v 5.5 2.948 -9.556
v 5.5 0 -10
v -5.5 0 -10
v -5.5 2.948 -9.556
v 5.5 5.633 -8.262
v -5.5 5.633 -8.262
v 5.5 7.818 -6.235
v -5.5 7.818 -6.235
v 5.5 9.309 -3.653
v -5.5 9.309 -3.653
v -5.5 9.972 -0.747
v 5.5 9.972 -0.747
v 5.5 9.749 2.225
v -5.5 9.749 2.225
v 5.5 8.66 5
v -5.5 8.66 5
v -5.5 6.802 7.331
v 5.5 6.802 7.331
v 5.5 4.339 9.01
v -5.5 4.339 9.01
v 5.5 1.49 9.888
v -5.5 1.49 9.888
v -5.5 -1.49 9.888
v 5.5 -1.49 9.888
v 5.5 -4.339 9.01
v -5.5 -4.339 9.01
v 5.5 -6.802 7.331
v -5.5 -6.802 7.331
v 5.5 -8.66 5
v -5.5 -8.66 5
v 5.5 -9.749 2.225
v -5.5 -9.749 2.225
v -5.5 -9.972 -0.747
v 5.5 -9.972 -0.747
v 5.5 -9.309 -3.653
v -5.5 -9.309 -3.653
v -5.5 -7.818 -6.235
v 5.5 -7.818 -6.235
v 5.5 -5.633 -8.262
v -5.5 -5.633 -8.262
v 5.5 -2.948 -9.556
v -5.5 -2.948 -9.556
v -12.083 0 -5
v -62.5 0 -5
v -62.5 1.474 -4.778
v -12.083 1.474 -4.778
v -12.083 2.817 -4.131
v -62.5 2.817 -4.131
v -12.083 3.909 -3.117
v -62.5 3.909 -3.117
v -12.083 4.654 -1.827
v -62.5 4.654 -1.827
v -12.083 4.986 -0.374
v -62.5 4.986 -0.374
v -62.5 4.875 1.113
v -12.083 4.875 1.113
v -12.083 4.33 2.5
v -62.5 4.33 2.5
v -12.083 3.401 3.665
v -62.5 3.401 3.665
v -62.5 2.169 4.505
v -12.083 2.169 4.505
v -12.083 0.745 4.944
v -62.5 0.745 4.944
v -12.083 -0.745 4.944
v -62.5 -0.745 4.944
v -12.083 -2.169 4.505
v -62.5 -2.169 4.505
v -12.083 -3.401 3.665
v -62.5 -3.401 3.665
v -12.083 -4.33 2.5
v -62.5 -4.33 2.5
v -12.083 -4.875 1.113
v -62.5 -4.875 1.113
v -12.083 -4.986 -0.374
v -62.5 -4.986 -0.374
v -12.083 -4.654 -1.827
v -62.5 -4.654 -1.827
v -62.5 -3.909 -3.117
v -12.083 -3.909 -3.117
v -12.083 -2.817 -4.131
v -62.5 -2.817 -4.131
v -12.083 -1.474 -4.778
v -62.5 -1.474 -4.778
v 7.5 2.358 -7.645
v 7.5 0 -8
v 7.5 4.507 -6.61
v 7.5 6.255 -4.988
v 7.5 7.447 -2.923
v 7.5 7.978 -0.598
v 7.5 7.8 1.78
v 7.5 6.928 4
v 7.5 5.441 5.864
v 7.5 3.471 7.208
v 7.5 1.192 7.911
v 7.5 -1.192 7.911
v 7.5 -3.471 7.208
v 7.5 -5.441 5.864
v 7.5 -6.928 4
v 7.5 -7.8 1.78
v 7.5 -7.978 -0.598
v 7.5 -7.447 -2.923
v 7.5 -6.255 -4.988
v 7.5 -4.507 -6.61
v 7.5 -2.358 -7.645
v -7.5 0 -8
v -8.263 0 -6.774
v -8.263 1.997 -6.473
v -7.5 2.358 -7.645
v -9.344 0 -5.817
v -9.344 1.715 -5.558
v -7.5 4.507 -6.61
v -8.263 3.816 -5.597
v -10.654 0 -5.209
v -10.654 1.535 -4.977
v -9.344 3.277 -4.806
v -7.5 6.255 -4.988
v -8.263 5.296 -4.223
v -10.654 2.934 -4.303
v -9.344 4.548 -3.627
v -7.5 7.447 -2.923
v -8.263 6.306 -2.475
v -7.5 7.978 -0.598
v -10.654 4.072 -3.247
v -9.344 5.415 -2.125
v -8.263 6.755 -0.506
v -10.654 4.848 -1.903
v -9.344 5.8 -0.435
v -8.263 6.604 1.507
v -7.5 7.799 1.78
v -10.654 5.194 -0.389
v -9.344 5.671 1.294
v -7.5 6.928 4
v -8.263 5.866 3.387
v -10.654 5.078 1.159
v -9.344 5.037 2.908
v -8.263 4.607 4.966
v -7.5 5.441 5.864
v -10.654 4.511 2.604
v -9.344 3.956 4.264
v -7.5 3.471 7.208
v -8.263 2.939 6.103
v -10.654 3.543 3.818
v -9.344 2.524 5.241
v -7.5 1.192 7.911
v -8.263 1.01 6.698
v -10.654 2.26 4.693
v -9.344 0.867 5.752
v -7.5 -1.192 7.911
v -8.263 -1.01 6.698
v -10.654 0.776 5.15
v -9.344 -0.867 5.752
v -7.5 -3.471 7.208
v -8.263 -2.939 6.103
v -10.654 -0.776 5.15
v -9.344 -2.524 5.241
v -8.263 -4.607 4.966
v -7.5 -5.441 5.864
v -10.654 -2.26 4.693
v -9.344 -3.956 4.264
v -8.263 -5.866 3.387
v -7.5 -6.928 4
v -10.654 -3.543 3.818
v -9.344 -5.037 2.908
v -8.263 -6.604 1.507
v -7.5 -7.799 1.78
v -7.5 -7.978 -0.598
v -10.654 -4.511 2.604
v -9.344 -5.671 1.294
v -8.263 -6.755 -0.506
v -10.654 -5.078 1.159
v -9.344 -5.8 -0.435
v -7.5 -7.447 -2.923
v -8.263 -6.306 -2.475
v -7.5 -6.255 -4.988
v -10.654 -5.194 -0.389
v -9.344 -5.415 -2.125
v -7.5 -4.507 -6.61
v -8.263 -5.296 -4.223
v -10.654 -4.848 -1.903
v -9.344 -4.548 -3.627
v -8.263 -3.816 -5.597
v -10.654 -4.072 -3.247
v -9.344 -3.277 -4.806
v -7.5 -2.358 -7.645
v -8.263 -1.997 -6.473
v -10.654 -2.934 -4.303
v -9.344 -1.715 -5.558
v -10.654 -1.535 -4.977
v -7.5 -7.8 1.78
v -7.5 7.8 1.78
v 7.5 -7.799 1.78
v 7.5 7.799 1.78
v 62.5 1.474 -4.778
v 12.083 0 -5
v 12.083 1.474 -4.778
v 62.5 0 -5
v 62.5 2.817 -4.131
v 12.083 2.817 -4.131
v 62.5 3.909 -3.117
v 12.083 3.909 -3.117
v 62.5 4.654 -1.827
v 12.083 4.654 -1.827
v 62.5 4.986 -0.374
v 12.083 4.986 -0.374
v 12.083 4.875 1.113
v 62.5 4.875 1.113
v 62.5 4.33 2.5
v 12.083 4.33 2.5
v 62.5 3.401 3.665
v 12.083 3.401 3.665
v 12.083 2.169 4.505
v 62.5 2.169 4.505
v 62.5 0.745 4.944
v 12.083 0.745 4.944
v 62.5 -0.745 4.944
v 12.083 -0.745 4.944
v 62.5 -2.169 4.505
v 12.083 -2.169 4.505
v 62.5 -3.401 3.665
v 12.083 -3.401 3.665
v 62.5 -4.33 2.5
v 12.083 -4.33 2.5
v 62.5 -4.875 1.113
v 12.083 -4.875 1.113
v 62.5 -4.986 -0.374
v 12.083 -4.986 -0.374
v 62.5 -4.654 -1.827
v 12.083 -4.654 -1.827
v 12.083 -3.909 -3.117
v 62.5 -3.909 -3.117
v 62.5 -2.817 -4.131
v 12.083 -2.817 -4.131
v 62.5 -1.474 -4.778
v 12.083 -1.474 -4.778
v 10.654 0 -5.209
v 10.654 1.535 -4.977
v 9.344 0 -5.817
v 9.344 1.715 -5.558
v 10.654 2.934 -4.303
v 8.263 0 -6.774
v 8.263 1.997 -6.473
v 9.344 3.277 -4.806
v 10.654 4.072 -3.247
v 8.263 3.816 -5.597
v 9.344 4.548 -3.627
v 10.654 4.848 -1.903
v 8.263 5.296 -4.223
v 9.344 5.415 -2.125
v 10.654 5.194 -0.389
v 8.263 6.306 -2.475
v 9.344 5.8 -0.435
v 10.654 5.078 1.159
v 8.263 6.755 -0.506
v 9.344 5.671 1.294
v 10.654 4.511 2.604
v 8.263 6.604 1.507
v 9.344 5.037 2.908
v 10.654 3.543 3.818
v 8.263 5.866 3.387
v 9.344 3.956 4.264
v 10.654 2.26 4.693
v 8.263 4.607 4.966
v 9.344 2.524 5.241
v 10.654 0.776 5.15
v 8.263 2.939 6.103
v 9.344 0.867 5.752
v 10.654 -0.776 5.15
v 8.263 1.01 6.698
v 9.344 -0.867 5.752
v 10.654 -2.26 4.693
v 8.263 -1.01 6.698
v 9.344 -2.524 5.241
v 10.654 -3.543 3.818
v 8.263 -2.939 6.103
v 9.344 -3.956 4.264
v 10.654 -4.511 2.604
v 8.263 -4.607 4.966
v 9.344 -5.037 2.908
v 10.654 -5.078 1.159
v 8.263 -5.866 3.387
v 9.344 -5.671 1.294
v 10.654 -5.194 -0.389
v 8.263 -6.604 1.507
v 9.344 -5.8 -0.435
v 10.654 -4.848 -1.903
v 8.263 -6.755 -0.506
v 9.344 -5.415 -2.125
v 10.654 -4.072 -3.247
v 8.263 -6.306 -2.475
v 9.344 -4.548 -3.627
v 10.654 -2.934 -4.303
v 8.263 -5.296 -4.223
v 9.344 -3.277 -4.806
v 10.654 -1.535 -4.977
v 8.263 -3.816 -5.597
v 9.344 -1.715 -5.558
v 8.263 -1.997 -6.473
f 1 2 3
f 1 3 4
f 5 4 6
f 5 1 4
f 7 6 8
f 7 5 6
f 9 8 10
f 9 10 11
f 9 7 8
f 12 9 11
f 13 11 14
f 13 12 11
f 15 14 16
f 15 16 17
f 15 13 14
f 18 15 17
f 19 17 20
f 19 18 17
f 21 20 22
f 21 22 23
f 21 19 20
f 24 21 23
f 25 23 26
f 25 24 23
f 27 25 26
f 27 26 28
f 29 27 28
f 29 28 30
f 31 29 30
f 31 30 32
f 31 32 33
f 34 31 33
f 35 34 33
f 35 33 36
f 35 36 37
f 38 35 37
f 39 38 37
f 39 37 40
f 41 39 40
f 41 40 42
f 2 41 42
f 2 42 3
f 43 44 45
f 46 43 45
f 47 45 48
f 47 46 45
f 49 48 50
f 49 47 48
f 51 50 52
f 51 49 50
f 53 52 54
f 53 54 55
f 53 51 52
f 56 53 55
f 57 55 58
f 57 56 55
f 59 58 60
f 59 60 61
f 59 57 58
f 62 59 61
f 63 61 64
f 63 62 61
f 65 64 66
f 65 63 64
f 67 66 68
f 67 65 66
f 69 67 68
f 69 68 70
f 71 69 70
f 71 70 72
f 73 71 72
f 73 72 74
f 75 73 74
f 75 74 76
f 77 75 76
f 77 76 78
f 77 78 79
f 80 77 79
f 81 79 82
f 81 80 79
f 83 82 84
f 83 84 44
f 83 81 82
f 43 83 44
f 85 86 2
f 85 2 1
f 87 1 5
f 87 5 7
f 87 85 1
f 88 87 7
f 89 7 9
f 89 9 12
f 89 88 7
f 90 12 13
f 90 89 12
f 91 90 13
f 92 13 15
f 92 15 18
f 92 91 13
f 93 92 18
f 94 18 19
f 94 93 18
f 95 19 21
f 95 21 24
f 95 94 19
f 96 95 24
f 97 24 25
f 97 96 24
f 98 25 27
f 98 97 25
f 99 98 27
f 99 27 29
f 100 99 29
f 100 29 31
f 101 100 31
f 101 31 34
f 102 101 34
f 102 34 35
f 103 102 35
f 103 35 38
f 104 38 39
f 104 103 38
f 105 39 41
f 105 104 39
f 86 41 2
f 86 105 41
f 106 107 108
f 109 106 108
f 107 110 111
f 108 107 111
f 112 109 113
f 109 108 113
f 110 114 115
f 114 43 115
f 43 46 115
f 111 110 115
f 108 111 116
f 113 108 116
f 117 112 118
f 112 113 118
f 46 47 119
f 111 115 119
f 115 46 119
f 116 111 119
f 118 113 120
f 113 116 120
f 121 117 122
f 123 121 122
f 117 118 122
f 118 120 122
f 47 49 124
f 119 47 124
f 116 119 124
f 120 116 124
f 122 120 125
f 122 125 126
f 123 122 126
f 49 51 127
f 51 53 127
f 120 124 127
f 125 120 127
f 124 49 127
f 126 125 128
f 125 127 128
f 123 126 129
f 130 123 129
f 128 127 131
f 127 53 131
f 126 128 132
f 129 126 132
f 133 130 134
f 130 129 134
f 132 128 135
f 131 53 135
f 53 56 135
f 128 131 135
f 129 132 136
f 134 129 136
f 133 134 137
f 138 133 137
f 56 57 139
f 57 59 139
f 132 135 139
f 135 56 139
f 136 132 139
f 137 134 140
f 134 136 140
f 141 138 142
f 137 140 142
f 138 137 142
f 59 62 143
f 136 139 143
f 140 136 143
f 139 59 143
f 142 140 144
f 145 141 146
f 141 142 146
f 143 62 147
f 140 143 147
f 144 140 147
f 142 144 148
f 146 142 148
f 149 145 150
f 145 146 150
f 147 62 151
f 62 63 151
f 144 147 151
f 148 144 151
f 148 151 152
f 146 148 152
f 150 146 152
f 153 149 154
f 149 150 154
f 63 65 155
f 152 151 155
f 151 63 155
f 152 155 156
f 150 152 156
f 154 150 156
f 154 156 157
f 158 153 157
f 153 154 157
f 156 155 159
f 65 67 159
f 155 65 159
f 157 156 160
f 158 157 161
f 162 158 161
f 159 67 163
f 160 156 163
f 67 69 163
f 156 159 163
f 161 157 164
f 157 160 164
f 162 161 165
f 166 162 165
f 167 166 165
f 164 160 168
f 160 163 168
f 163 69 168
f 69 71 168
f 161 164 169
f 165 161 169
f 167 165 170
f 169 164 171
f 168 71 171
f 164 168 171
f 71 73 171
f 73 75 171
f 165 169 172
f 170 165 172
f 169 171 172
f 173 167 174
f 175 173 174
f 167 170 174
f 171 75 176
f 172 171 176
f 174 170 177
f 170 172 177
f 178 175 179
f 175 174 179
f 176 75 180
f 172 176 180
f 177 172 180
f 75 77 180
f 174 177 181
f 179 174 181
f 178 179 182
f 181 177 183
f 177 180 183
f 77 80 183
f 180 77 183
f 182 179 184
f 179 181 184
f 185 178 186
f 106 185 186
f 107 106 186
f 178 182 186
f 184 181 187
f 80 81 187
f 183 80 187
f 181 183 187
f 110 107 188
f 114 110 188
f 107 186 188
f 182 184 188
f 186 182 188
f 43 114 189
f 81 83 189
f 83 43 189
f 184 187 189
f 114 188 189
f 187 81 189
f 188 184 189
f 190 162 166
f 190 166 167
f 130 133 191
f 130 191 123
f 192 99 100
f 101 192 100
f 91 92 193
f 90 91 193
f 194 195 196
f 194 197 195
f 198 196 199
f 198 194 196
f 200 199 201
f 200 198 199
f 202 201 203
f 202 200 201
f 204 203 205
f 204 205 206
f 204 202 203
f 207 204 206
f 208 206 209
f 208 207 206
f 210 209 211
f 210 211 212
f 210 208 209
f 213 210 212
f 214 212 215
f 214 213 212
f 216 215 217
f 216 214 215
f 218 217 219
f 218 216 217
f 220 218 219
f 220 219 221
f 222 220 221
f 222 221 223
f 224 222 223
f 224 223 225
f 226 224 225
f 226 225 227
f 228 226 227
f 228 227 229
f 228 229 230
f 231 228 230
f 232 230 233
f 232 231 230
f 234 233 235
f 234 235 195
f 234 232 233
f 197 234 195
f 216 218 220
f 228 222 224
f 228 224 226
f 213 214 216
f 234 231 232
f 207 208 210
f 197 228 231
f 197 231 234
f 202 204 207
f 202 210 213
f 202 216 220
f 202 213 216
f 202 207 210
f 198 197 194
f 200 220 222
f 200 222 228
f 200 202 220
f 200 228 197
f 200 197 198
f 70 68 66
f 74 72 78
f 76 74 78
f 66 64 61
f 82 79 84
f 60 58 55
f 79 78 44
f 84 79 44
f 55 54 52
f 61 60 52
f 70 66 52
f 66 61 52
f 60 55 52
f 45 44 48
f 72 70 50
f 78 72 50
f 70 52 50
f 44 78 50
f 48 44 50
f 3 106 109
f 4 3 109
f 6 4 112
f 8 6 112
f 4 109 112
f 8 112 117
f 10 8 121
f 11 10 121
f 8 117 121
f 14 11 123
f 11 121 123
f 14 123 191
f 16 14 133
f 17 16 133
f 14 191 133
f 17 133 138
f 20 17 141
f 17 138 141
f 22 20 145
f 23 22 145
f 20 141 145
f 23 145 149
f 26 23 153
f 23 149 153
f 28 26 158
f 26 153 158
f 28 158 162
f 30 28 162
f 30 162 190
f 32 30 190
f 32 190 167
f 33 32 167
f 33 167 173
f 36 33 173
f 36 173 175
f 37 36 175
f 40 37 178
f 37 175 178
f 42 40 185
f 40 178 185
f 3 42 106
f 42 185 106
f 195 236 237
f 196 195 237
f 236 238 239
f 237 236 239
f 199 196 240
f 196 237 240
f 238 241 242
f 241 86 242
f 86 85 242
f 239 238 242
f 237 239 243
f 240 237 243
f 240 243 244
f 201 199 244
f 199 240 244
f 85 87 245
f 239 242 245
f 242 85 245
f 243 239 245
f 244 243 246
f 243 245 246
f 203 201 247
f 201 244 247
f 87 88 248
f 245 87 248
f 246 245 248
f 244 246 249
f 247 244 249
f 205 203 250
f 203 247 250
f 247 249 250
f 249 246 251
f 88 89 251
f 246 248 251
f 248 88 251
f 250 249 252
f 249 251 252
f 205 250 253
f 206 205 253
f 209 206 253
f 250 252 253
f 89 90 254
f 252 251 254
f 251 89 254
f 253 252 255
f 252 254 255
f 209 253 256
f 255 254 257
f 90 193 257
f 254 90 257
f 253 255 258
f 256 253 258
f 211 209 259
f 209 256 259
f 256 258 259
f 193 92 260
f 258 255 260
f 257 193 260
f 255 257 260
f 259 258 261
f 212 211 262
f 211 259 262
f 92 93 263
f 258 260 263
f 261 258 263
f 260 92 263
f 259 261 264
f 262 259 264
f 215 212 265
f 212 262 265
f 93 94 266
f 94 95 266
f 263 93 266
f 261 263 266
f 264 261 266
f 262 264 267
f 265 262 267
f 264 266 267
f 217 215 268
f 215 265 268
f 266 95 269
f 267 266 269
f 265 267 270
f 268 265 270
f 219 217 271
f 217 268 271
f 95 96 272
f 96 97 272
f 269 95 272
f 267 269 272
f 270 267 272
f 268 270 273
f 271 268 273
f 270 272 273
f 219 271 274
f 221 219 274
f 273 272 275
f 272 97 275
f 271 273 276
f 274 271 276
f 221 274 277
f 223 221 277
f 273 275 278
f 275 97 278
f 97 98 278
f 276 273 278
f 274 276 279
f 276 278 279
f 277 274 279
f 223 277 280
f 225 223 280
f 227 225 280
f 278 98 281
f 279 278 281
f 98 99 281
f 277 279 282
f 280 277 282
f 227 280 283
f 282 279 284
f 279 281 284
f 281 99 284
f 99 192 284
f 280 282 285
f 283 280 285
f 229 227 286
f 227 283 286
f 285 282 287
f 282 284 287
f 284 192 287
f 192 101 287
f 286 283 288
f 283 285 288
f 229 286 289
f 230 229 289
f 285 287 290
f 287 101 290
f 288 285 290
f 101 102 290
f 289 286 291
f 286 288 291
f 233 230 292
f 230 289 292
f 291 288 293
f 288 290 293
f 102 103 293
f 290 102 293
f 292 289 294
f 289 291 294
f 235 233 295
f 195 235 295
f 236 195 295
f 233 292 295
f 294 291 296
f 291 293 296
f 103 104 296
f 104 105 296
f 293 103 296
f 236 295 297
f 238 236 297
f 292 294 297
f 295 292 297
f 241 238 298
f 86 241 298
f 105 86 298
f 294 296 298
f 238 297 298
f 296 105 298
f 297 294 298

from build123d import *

# Parameters (mm, degrees)
SKETCH2_R           = 5
BOSS_EXTRUDE1_DEPTH = 62.5
SKETCH3_R           = 8
BOSS_EXTRUDE2_DEPTH = 7.5
FILLET1_R           = 5
SKETCH4_R           = 10
BOSS_EXTRUDE3_DEPTH = 7.5
CHAMFER1_SIZE       = 2


# Some blends are built 0.0001 mm under size
with BuildPart() as part:
    # Sketch2 → Boss-Extrude1 (new, symmetric)
    with BuildSketch(Plane(origin=(0, 0, 0), x_dir=(0, 0, -1), z_dir=(1, 0, 0))):
        Circle(SKETCH2_R)
    extrude(amount=BOSS_EXTRUDE1_DEPTH, both=True)

    # Sketch3 → Boss-Extrude2 (add, symmetric)
    with BuildSketch(Plane(origin=(0, 0, 0), x_dir=(0, 0, -1), z_dir=(1, 0, 0))):
        Circle(SKETCH3_R)
    extrude(amount=BOSS_EXTRUDE2_DEPTH, both=True)

    # Fillet1
    # the kernel refuses this fillet: 5 mm, written as the material it adds along each edge
    with BuildSketch(Plane(origin=(-7.5, 0, 0), x_dir=(0, 0, -1), z_dir=(0, -1, 0))) as fillet1_piece_1:
        with BuildLine():
            CenterArc((10, -4.582575695), FILLET1_R, 113.578178478, 66.421821522)
            Line((8, 0), (7.96, 0.091651514))
            ThreePointArc((7.96, 0.091651514), (6.5, 0.1), (5, 0.1))
            Line((5, 0.1), (4.9, 0))
            Line((4.9, 0), (4.9, -4.582575695))
            Line((4.9, -4.582575695), (5, -4.582575695))
        make_face()
    revolve(axis=Axis((-7.5, 0, 0), (1, 0, 0)))
    with BuildSketch(Plane(origin=(7.5, 0, 0), x_dir=(0, 0, -1), z_dir=(0, -1, 0))) as fillet1_piece_2:
        with BuildLine():
            CenterArc((10, 4.582575695), FILLET1_R, 180, 66.421821522)
            Line((5, 4.582575695), (4.9, 4.582575695))
            Line((4.9, 4.582575695), (4.9, 0))
            Line((4.9, 0), (5, -0.1))
            ThreePointArc((5, -0.1), (6.5, -0.1), (7.96, -0.091651514))
            Line((7.96, -0.091651514), (8, 0))
        make_face()
    revolve(axis=Axis((7.5, 0, 0), (1, 0, 0)))

    # Sketch4 → Boss-Extrude3 (add, symmetric)
    with BuildSketch(Plane(origin=(0, 0, 0), x_dir=(0, 0, -1), z_dir=(1, 0, 0))):
        Circle(SKETCH4_R)
    extrude(amount=BOSS_EXTRUDE3_DEPTH, both=True)

    # Chamfer1
    chamfer1_edges = [part.edges().sort_by_distance(p)[0] for p in [
        (-7.5, 0, 10),
        (7.5, 0, 10),
    ]]
    chamfer(chamfer1_edges, length=CHAMFER1_SIZE - 0.0001)  # a hair under: the kernel refuses the full size


solid = part.part
